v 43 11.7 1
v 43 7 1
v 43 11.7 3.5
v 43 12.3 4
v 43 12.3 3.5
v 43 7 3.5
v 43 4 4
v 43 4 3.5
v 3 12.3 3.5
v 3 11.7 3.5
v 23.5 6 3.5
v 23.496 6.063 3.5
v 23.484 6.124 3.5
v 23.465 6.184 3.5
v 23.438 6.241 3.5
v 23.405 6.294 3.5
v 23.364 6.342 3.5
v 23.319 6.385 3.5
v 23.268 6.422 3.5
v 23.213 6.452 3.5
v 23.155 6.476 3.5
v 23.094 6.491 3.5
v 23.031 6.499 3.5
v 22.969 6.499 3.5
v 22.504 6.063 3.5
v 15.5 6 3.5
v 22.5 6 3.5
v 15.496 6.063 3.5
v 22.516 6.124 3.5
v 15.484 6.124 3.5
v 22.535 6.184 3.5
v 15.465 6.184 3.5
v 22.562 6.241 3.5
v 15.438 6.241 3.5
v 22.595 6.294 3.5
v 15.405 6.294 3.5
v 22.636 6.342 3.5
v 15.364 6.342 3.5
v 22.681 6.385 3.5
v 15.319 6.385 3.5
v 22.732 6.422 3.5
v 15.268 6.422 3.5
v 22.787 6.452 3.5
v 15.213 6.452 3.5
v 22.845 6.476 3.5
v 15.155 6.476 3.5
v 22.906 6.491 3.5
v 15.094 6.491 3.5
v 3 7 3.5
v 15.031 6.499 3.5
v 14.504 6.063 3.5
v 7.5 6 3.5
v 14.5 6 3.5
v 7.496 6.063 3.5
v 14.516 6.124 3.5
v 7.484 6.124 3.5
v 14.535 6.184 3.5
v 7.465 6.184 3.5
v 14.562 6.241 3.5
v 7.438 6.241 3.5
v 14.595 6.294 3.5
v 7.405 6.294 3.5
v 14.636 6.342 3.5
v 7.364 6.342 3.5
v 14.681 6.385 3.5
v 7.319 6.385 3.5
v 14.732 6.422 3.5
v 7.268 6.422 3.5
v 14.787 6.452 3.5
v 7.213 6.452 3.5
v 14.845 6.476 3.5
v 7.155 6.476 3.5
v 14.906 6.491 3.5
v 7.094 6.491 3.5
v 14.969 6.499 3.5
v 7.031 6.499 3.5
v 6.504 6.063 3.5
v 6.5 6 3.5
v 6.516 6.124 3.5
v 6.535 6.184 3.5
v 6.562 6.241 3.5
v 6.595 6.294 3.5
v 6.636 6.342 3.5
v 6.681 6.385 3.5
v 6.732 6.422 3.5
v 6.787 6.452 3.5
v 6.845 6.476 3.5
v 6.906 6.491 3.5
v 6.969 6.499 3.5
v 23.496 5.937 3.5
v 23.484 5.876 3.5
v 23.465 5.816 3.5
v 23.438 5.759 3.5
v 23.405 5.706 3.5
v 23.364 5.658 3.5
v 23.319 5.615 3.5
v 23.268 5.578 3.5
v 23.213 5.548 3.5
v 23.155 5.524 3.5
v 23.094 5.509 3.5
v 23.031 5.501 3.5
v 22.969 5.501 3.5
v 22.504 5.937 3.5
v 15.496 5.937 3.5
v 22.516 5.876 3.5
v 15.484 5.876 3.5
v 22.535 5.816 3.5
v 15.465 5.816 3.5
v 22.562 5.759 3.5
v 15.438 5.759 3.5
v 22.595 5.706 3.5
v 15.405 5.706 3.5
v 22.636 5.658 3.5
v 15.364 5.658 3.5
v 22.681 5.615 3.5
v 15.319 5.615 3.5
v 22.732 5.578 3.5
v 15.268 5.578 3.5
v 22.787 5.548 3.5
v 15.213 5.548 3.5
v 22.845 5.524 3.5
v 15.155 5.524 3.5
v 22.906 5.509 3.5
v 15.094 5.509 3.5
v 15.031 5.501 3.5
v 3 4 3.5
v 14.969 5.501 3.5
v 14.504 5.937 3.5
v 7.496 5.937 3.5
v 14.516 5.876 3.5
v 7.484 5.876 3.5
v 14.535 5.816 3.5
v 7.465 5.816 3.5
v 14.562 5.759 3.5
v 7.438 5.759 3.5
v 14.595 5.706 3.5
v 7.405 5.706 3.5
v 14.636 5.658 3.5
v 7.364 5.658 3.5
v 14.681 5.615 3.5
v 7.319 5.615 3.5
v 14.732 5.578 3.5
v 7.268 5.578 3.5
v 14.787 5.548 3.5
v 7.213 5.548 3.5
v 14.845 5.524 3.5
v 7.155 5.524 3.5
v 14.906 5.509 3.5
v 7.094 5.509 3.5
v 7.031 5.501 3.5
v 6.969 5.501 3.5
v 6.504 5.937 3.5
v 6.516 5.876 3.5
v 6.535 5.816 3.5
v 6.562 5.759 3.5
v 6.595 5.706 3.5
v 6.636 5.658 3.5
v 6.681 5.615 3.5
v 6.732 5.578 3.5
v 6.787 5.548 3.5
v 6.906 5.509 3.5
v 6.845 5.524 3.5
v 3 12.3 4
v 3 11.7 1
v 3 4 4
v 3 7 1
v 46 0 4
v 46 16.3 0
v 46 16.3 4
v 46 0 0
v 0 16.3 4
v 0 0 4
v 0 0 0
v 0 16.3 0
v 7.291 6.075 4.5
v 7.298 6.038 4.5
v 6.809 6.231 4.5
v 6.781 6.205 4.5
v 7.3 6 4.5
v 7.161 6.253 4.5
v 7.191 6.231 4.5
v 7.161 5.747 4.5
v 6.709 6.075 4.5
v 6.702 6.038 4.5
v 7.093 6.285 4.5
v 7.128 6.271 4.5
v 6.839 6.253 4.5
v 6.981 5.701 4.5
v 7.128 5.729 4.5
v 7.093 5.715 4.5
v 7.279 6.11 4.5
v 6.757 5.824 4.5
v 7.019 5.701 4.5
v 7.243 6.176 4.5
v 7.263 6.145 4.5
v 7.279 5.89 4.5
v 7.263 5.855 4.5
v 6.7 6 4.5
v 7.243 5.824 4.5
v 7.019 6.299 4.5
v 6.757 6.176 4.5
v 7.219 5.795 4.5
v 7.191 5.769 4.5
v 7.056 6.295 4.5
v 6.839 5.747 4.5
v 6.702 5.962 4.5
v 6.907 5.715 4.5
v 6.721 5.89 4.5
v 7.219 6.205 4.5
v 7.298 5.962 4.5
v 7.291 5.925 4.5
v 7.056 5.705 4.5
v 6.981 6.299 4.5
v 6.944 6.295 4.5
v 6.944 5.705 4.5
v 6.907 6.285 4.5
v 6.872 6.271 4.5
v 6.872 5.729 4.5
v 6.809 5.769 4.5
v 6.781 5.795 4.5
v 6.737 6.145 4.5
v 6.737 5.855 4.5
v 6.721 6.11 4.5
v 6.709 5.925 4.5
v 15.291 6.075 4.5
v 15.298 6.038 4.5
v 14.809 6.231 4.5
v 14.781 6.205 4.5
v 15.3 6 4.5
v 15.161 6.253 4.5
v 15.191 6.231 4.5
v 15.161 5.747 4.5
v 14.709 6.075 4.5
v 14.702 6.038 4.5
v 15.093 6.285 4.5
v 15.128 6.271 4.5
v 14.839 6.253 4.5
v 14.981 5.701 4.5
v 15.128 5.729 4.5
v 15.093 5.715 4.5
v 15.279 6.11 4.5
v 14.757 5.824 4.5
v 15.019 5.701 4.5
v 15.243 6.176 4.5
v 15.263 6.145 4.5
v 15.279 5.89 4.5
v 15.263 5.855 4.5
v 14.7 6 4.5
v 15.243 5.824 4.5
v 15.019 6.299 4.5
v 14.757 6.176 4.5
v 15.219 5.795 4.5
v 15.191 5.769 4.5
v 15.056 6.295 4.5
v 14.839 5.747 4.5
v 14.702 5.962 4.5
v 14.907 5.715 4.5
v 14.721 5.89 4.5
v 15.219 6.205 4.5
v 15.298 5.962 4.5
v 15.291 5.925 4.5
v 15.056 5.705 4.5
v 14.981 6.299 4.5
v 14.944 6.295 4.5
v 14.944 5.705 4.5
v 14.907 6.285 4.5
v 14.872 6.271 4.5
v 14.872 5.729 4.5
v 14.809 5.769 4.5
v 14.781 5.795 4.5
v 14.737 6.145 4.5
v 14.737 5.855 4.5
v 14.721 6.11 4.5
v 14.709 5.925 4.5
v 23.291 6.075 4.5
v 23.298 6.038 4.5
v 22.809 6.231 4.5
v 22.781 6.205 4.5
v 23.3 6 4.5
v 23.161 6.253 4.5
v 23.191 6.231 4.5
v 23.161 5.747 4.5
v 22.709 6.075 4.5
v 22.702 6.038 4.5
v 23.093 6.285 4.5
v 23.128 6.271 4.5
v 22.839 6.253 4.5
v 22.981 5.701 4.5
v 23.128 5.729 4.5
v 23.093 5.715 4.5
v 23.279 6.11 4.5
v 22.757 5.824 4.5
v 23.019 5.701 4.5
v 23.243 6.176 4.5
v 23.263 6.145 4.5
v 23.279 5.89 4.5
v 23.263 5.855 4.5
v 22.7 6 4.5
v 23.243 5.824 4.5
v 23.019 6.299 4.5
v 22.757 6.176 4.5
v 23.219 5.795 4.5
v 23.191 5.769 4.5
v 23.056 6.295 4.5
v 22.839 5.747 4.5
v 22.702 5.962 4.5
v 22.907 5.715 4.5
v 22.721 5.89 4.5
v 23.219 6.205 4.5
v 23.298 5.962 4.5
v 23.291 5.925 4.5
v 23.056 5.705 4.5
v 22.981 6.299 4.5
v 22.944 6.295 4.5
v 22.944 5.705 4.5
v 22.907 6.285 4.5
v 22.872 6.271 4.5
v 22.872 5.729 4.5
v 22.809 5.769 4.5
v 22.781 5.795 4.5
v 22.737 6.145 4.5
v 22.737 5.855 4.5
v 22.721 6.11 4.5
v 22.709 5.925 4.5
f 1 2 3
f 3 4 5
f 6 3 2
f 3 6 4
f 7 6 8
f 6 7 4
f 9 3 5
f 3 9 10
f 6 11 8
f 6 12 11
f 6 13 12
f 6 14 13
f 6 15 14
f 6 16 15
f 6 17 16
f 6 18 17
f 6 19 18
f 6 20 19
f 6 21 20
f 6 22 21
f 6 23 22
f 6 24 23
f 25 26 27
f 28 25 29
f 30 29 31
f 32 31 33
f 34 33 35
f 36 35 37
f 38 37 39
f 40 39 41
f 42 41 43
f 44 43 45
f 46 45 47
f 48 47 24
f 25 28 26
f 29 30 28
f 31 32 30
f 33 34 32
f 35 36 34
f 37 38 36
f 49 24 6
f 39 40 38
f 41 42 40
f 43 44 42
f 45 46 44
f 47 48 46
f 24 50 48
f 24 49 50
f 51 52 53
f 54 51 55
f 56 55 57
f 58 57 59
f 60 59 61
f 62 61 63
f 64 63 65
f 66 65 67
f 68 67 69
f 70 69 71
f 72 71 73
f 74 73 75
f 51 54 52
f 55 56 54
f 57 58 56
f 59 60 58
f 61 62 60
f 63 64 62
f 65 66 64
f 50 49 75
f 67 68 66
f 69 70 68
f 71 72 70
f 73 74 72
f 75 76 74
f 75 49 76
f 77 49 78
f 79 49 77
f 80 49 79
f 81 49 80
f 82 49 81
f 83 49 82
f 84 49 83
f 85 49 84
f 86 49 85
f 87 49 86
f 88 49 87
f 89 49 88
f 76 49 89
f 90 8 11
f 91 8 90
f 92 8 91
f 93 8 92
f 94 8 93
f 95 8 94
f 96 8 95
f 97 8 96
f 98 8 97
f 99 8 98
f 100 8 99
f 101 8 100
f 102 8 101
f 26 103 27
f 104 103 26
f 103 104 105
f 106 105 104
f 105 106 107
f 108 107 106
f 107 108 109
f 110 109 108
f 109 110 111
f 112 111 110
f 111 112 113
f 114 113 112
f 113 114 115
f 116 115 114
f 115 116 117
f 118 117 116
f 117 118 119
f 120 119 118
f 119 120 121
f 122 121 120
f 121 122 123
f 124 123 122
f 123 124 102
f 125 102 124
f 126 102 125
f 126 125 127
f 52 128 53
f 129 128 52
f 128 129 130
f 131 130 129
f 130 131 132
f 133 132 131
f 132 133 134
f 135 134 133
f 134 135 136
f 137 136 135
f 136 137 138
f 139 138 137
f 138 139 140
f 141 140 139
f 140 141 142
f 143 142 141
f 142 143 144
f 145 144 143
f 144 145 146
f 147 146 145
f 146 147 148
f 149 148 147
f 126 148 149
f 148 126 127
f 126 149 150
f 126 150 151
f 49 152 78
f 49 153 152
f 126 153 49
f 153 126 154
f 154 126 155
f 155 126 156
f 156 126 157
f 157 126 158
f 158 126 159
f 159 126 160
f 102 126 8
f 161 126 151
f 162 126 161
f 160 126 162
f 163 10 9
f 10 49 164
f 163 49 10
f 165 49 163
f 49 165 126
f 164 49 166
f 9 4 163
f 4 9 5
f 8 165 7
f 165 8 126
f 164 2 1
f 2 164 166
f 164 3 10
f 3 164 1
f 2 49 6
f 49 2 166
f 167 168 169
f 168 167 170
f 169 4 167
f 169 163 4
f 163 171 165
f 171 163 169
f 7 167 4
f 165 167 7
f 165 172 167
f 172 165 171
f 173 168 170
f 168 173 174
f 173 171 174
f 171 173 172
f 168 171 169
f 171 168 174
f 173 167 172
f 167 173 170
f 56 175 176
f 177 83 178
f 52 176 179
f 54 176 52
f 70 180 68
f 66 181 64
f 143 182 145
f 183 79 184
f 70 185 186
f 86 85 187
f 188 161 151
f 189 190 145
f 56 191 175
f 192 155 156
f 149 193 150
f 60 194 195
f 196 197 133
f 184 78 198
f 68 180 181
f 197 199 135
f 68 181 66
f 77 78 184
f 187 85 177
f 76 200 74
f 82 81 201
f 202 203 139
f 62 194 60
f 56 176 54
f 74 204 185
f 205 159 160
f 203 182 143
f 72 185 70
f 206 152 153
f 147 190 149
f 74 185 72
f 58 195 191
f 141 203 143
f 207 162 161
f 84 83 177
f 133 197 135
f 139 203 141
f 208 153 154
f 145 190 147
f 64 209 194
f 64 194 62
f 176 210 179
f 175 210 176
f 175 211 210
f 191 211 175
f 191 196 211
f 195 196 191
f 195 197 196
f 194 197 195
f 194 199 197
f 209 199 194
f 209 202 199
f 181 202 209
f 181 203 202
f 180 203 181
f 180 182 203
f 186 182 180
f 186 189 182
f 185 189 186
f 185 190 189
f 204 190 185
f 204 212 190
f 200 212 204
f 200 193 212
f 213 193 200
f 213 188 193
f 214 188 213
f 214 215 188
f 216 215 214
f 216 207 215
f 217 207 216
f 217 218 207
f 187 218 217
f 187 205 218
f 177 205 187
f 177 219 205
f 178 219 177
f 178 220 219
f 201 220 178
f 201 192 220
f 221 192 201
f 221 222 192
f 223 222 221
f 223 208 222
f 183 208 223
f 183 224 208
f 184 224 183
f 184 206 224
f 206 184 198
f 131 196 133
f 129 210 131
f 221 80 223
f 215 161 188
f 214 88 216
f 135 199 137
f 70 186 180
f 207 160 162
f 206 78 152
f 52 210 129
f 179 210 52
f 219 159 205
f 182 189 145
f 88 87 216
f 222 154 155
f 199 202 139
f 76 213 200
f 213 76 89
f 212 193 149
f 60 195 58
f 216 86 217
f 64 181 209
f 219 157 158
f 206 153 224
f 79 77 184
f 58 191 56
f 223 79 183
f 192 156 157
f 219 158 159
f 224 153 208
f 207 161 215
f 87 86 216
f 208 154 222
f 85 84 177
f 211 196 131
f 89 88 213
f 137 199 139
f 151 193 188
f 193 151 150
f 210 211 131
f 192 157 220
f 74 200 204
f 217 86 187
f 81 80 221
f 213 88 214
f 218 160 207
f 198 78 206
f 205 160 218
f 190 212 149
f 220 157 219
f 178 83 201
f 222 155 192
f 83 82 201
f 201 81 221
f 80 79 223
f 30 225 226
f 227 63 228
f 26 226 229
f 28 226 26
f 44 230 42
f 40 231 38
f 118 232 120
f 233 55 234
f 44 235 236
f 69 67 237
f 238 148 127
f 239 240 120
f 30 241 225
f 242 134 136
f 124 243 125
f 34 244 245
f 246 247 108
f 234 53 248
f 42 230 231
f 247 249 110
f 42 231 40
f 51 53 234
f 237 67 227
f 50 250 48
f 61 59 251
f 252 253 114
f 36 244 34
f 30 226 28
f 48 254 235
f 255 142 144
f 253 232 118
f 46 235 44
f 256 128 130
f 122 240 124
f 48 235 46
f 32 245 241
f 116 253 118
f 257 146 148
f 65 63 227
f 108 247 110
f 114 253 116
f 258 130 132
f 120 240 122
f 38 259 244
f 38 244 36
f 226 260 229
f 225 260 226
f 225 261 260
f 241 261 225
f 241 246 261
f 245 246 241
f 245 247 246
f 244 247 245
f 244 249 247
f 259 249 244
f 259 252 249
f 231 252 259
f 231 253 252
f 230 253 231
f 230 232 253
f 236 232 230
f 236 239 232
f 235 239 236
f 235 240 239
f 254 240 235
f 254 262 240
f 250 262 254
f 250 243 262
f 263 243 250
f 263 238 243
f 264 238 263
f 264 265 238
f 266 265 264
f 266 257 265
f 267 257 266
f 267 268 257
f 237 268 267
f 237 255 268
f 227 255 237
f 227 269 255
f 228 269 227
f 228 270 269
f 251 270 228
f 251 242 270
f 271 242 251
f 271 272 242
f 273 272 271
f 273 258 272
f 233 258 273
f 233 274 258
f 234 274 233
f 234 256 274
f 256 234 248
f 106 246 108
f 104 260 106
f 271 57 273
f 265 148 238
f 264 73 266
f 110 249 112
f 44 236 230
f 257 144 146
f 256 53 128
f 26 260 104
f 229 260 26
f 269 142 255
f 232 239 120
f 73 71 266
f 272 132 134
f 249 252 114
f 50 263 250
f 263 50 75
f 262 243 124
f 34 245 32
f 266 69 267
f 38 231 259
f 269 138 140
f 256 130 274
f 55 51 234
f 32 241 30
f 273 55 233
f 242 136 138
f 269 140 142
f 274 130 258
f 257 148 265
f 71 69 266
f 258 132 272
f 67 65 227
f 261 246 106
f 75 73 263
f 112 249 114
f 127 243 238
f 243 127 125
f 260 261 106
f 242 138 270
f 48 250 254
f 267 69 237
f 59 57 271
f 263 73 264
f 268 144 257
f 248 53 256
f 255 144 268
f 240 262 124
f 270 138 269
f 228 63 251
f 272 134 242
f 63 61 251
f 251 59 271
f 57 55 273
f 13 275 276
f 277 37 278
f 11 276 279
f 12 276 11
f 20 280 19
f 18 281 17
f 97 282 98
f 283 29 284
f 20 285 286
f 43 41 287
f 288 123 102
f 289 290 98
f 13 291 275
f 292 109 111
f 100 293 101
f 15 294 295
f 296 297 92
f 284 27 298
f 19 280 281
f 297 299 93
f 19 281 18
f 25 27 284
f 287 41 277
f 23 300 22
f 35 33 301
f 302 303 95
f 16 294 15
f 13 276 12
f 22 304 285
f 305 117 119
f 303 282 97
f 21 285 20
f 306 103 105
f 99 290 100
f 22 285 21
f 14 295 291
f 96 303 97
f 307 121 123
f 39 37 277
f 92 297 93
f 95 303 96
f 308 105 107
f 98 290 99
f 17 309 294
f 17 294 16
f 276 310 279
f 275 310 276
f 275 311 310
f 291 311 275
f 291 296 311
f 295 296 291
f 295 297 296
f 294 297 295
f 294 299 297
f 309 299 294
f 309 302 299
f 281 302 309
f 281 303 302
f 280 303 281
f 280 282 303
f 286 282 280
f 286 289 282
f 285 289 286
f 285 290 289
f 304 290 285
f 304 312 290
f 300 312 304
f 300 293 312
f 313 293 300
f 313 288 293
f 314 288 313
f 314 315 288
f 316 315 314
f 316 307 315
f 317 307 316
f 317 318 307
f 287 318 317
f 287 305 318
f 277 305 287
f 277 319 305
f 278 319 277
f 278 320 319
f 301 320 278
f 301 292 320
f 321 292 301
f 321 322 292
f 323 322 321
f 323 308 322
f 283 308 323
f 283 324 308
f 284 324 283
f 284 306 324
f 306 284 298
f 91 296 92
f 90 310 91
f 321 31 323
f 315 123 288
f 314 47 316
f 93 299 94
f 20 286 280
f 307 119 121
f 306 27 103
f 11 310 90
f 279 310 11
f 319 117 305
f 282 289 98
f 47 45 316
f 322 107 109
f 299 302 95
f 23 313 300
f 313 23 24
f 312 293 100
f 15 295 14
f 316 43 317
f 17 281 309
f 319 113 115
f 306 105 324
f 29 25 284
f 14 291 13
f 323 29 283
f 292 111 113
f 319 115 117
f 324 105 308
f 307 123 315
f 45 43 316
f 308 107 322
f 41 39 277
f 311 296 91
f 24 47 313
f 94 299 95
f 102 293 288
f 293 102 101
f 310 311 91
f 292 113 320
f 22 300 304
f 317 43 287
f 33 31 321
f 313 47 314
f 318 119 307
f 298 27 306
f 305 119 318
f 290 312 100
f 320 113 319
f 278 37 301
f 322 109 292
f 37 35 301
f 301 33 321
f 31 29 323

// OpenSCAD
width = 40;
tray_height = 4;

rows = 1;
tape_height = 8.3;
row_margin = 1;
tape_thickness = 0.5;

part_width = 4.7;
sprocket_width = 4;
parts_margin = 3;

module sprocketPin() {
    cylinder(d1=1, d2=0.6, h=tape_thickness * 2, $fn=50);
}

difference() {
    cube([width + (2 * parts_margin),(rows) * (tape_height + row_margin) + (parts_margin * 2) + 1, tray_height]);
    for(y=[0:rows-1]) {
        row_bottom = y * (tape_height + row_margin) + parts_margin;
        translate([parts_margin,row_bottom + 1, tray_height - tape_thickness]) 
           cube([width,tape_height, 2]);    
        translate([parts_margin,row_bottom + (sprocket_width), tray_height - 3]) cube([width, part_width, 4]);
    }
}

for(y=[0:rows-1]) {
    row_bottom = y * (tape_height + row_margin) + parts_margin;
    translate([parts_margin + 4, row_bottom + 3 , (tray_height - tape_thickness)]) sprocketPin();
    translate([parts_margin + 12, row_bottom + 3 , (tray_height - tape_thickness)]) sprocketPin();
    translate([parts_margin + 20, row_bottom + 3 , (tray_height - tape_thickness)]) sprocketPin();
}
